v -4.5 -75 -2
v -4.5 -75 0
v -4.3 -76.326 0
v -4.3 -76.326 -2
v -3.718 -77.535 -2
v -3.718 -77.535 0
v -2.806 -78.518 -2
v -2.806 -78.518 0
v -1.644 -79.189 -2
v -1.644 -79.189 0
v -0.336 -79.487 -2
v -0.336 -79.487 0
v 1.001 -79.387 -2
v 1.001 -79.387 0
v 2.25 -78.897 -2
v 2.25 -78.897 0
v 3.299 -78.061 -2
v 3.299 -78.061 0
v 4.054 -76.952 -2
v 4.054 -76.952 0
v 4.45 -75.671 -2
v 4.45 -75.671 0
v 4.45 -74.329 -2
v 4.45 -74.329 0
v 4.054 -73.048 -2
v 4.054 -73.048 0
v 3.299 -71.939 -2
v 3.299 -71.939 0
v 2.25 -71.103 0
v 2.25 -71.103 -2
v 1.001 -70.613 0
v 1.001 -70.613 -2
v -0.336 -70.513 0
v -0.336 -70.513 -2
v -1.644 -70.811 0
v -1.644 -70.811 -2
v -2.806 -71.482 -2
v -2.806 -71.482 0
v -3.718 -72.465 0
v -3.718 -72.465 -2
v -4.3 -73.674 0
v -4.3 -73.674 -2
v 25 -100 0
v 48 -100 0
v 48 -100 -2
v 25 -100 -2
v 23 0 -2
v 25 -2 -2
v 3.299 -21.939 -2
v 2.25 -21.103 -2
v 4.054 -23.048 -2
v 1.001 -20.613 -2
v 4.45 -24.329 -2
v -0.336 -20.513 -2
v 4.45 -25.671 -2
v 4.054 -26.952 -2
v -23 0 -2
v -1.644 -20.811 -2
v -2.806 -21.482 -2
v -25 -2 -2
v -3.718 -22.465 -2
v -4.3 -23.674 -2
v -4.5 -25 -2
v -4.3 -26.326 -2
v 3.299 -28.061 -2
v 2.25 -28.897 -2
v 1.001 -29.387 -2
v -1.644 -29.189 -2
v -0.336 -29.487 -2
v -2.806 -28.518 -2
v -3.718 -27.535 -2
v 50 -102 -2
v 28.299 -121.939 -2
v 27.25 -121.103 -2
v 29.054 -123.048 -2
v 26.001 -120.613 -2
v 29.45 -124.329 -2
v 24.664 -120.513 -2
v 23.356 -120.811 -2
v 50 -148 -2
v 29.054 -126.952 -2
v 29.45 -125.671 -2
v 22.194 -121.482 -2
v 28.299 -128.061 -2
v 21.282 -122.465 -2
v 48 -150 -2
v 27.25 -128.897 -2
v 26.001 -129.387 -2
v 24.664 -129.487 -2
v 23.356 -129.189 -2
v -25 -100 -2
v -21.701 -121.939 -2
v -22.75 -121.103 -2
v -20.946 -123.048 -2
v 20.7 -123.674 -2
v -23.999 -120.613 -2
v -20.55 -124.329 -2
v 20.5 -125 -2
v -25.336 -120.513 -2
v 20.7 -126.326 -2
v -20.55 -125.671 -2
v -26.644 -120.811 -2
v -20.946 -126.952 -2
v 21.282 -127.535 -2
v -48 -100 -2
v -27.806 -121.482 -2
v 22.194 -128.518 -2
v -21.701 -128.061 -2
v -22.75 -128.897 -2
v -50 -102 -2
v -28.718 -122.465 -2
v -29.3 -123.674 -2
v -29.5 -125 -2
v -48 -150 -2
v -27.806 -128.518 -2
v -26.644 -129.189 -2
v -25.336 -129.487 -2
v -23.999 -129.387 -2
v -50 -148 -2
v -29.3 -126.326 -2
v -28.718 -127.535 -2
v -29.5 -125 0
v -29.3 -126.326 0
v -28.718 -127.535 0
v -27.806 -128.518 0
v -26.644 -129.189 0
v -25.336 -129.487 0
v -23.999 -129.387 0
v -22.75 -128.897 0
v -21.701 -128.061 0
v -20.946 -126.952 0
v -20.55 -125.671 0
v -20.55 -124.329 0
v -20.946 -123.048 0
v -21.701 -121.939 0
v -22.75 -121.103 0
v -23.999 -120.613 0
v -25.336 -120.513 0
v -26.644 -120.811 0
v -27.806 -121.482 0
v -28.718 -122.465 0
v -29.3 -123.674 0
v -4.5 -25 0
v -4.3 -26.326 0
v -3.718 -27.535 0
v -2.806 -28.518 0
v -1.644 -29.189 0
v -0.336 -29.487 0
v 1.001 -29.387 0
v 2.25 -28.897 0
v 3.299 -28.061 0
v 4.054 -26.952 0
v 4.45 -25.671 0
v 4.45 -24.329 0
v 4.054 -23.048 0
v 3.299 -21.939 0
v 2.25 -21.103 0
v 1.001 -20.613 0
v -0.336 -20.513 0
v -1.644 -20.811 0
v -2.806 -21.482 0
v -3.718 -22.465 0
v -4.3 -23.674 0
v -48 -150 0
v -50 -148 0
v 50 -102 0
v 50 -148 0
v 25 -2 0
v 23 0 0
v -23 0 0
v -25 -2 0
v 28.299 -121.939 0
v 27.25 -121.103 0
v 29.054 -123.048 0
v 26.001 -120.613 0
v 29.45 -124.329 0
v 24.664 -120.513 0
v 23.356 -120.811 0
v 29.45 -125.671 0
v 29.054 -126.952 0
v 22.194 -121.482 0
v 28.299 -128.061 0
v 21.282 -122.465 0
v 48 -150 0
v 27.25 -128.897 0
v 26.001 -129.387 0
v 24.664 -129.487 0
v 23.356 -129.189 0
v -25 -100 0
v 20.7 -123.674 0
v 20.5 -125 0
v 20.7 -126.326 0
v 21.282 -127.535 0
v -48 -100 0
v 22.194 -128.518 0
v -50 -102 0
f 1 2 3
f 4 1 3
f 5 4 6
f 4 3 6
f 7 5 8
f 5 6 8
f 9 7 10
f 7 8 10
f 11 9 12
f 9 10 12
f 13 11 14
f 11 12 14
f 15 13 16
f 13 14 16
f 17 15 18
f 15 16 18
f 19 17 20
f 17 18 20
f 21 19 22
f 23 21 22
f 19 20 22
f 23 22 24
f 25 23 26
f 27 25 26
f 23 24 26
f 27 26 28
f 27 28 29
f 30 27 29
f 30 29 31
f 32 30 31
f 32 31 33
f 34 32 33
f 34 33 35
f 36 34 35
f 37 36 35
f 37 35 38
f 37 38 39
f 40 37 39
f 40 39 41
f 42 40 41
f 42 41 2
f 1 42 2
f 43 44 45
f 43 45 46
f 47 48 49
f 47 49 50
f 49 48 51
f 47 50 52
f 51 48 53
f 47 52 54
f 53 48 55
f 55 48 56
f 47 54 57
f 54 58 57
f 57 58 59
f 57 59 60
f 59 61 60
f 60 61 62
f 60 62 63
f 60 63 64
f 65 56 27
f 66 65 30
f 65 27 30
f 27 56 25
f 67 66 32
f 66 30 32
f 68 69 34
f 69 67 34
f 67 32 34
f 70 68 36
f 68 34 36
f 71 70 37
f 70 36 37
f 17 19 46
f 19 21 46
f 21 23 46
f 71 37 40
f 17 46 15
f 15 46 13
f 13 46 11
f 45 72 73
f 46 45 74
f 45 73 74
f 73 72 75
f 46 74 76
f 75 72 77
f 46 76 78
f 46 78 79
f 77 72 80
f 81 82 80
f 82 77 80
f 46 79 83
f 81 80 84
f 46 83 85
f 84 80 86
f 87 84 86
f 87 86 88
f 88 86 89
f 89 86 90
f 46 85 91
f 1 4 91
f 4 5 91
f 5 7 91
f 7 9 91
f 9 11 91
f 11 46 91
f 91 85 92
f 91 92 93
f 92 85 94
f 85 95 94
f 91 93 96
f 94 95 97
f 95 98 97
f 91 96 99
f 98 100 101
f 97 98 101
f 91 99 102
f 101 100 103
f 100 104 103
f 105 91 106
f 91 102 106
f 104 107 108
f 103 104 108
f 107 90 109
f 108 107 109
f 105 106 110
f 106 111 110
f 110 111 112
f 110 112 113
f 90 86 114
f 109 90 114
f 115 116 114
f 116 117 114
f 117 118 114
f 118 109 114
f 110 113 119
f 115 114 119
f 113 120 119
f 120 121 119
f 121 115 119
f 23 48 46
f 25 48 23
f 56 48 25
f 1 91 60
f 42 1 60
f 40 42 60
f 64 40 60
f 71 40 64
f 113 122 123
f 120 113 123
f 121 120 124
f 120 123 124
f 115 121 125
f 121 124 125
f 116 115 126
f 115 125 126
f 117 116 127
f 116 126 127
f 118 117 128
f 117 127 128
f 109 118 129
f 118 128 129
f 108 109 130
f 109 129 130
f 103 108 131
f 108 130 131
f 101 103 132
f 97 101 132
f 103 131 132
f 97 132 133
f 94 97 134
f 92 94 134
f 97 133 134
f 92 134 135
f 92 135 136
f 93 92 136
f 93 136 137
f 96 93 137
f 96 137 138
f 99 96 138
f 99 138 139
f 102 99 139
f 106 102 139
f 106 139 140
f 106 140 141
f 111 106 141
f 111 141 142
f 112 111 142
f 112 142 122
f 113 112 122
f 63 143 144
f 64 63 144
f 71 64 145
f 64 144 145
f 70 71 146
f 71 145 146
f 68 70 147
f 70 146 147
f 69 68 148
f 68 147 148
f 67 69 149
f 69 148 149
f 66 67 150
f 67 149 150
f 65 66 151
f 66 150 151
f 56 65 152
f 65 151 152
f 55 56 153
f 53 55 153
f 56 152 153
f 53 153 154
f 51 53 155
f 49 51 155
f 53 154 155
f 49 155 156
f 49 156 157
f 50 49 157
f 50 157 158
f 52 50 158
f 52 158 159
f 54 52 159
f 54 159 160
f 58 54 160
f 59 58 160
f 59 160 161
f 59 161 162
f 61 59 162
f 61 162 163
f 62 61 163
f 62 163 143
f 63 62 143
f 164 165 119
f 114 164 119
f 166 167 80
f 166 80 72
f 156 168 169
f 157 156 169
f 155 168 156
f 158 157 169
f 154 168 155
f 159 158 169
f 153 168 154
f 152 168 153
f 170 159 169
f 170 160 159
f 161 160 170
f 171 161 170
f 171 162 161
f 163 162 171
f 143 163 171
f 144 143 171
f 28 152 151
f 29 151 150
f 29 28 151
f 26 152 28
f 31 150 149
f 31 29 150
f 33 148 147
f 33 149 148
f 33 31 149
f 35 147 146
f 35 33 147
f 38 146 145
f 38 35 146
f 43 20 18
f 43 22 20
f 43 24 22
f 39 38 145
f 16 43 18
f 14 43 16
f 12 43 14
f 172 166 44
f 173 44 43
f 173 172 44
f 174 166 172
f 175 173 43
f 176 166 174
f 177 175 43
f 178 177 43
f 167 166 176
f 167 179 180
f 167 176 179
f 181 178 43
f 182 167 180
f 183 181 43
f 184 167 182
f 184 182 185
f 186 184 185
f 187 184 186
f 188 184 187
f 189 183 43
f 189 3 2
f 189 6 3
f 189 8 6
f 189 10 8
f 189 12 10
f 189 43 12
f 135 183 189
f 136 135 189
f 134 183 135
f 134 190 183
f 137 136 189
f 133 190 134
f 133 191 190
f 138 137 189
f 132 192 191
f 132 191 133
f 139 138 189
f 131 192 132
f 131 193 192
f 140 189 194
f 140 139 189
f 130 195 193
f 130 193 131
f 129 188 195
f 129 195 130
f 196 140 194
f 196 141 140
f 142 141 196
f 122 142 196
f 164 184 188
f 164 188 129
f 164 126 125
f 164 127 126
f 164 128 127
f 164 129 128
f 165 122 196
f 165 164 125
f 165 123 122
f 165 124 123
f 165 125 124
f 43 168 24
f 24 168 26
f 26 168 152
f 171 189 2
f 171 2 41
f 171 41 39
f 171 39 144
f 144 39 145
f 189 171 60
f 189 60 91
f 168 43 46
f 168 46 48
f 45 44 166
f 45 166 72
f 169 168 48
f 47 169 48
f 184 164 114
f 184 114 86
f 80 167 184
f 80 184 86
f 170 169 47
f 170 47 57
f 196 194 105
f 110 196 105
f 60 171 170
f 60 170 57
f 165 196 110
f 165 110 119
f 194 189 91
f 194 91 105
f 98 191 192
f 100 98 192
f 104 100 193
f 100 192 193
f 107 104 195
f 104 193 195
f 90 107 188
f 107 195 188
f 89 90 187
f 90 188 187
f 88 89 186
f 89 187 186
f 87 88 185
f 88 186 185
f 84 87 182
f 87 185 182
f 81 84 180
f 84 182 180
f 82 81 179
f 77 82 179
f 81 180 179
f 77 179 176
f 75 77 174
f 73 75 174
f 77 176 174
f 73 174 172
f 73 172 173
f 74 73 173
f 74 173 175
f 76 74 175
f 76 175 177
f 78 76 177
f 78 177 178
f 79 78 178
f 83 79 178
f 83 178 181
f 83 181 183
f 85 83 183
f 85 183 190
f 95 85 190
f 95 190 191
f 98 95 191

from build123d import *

# Parameters (mm, degrees)
EXTRUDE_1_DEPTH   = 2
HOLE_WIZARD_M81_D = 9
CHAMFER_1_SIZE    = 2


with BuildPart() as part:
    # Эскиз1 → Бобышка-Вытянуть1 (new body)
    with BuildSketch(Plane(origin=(0, 0, 0), x_dir=(1, 0, 0), z_dir=(0, 0, -1))):
        Polygon((-50, 150), (50, 150), (50, 100), (25, 100), (25, 0), (-25, 0), (-25, 100), (-50, 100), align=None)
    extrude(amount=EXTRUDE_1_DEPTH)

    # Отверстие с зазором M81 (through all)
    with Locations(Plane(origin=(0, 0, -2), x_dir=(1, 0, 0), z_dir=(0, 0, -1))):
        with Locations((0, 25), (-25, 125), (25, 125), (0, 75)):
            Hole(HOLE_WIZARD_M81_D / 2)

    # Фаска1
    chamfer_1_edges = [part.edges().sort_by_distance(p)[0] for p in [
        (-50, -100, -1),
        (-50, -150, -1),
        (50, -150, -1),
        (50, -100, -1),
        (25, 0, -1),
        (-25, 0, -1),
    ]]
    chamfer(chamfer_1_edges, length=CHAMFER_1_SIZE)


solid = part.part
